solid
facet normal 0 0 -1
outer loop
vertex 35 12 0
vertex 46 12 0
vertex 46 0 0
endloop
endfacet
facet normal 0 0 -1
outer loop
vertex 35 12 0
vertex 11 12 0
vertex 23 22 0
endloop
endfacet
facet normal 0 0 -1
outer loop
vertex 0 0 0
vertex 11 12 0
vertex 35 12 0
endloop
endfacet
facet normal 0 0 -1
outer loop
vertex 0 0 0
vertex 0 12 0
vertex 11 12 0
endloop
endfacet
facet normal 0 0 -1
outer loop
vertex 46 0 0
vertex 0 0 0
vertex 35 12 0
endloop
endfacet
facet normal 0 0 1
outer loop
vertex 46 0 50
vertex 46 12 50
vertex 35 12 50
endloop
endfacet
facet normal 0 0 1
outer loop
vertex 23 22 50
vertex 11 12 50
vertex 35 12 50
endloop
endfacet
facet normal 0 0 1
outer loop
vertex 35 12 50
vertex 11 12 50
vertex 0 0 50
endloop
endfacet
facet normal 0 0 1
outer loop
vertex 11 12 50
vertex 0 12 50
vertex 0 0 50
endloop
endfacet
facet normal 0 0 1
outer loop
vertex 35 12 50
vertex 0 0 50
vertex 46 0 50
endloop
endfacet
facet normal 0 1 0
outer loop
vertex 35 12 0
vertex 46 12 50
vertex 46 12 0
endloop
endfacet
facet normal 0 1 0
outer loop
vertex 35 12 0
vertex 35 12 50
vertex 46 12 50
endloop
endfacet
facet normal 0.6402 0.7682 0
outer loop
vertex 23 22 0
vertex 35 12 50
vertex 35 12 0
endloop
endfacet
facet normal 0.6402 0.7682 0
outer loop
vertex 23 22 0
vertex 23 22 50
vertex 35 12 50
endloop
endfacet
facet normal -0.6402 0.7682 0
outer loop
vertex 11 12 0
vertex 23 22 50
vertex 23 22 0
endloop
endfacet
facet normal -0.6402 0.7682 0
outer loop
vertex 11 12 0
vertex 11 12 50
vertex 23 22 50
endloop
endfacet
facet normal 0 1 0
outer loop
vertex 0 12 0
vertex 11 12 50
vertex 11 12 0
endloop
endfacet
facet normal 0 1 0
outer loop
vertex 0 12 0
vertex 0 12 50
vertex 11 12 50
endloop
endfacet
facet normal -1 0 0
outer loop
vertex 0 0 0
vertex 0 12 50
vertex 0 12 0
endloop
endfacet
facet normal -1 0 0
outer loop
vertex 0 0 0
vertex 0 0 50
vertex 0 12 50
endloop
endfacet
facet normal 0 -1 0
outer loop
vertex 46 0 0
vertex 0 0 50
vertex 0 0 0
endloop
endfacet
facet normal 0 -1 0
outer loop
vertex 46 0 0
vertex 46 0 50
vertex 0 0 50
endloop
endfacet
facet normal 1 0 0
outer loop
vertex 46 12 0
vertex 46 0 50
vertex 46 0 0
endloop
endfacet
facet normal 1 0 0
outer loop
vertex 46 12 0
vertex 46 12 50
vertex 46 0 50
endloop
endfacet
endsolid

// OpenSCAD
$fn = 32;

// ----------------------------------------------------------------------
// V guide rail: vrib, 46 mm wide
// ----------------------------------------------------------------------

// --- parameters (mm) ---
rail_w = 46;              // rail width, X
base_t = 12;              // base plate thickness
v_depth = 10;             // V feature depth / height
v_half_w = 12;            // half width of the V at the base face
plate_t = 50;             // rail length, Z (the extrusion height)

profile = [[0, 0], [46, 0], [46, 12], [35, 12], [23, 22], [11, 12], [0, 12]];  // primary outline, 7 points, counter clockwise

// --- the one profile operation ---
linear_extrude(height = plate_t) polygon(points = profile);
